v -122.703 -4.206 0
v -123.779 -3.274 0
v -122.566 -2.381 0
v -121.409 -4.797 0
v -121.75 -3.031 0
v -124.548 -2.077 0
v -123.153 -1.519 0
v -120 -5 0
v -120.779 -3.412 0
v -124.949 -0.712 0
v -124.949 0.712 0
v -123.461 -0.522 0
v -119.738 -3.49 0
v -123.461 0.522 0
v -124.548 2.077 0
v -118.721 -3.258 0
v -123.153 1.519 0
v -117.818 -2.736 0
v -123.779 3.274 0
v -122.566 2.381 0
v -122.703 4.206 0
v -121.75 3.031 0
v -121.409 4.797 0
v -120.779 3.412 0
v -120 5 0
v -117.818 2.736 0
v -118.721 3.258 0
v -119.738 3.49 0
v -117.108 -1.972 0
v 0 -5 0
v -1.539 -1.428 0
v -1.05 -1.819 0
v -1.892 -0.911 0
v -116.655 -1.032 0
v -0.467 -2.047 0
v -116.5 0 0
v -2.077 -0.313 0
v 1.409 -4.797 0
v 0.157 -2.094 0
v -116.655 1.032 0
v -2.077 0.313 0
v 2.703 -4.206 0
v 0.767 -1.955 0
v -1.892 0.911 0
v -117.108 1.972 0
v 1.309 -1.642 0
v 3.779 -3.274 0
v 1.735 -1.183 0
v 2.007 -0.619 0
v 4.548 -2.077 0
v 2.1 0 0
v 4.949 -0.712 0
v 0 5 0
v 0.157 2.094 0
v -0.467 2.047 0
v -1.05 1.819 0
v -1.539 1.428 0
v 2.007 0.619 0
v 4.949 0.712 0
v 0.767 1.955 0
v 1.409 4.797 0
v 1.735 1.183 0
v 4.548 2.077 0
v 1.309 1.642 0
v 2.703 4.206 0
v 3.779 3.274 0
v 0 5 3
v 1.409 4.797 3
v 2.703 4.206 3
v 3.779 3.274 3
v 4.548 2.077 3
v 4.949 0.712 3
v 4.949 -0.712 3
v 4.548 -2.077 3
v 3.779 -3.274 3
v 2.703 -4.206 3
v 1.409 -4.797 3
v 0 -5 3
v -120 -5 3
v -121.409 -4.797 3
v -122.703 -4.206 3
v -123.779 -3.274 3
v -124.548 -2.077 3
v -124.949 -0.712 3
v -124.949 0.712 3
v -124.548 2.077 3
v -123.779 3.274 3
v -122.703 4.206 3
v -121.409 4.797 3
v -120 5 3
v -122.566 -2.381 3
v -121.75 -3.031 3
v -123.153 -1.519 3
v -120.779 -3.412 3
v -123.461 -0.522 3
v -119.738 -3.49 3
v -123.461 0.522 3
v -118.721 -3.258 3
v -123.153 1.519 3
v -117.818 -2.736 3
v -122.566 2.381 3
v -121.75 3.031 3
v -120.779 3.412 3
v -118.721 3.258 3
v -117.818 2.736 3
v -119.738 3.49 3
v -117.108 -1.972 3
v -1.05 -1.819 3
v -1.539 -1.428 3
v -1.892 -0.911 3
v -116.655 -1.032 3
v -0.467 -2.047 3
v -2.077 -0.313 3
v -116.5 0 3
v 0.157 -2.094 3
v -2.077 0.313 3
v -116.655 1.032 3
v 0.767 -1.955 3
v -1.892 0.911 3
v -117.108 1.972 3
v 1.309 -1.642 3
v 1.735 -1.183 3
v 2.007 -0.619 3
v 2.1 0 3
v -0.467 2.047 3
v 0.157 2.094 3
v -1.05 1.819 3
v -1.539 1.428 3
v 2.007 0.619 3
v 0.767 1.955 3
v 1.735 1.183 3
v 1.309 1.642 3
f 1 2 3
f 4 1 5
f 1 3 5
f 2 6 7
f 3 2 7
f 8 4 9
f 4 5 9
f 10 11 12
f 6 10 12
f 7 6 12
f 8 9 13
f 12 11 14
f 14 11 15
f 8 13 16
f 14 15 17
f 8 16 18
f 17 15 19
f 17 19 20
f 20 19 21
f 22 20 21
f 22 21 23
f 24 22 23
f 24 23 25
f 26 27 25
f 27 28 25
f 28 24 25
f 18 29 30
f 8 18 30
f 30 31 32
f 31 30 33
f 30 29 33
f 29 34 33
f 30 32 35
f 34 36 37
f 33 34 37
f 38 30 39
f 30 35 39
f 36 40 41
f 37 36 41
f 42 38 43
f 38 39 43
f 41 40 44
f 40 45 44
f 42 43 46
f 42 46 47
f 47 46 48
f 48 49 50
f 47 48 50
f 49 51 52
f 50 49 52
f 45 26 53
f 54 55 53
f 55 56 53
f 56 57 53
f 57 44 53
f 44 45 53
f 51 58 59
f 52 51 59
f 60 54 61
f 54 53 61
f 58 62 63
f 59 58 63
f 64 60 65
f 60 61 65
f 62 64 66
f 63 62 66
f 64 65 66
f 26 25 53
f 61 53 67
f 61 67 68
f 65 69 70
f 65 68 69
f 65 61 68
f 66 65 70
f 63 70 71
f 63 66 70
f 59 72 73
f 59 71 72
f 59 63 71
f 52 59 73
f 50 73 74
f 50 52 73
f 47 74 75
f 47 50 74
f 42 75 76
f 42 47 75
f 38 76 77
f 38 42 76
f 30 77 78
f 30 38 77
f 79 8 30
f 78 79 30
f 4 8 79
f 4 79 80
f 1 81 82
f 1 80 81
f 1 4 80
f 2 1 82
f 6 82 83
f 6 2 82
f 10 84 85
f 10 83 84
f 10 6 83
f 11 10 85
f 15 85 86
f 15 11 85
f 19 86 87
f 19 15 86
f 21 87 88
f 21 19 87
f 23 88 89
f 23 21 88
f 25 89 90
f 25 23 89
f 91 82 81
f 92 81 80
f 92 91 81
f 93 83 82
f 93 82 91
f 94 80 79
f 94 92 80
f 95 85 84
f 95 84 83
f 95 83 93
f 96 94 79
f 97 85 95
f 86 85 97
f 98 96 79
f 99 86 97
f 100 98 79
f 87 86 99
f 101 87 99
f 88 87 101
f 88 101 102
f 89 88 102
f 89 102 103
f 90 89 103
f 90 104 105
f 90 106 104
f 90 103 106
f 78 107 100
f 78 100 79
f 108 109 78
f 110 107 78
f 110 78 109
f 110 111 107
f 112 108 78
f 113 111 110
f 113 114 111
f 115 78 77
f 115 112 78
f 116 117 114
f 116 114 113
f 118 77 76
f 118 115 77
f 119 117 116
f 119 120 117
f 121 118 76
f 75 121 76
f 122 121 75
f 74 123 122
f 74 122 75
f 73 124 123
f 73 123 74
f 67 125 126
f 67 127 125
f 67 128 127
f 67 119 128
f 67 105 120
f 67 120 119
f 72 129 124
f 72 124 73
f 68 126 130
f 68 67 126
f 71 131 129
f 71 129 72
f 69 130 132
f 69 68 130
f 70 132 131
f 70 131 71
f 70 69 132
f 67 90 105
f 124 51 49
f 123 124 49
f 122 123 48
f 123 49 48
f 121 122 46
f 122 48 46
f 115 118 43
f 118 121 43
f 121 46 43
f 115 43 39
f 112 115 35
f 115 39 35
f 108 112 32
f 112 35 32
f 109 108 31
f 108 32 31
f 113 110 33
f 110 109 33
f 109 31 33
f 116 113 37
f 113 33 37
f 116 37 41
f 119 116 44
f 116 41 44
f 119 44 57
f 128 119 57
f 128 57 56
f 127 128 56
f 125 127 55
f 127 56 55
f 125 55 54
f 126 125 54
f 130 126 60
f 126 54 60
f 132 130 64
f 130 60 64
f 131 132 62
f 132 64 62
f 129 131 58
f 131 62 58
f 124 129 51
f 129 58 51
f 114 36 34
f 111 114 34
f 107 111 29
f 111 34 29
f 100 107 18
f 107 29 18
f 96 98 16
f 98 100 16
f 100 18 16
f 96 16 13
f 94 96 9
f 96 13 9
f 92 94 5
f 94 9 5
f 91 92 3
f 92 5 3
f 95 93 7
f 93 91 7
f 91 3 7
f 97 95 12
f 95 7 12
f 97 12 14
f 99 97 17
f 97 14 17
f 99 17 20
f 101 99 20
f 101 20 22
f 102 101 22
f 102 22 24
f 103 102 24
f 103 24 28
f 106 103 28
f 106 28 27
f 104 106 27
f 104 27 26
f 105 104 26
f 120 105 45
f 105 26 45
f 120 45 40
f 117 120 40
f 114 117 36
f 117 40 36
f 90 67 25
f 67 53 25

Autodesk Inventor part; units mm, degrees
ref_plane "YZ Plane" through (0, 0, 0) normal (1, 0, 0) x (0, 1, 0)
ref_plane "XZ Plane" through (0, 0, 0) normal (0, 1, 0) x (-1, 0, 0)
ref_plane "XY Plane" through (0, 0, 0) normal (0, 0, 1) x (1, 0, 0)
sketch "草圖1" plane through (0, 0, 0) normal (0, 0, 1) x (1, 0, 0)
  line L0 (-120, 0) -> (0, 0) construction
  line L1 (-120, -5) -> (0, -5)
  line L2 (0, 5) -> (-120, 5)
  arc A0 (-120, 5) -> (-120, -5) centre (-120, 0) ccw
  arc A1 (0, -5) -> (0, 5) centre (0, 0) ccw
  circle A2 centre (-120, 0) radius 3.5
  circle A3 centre (0, 0) radius 2.1
  point P0 (-60, 0)
  dimension "d0" = 120
  dimension "d1" = 10
  dimension "d2" = 7
  dimension "d3" = 4.2
extrude "擠出1" add sketch "草圖1" along normal blind 3
sketch "草圖4" plane through (0, 0, 3) normal (0, 0, 1) x (1, 0, 0)
  line L0 (2.932, 0.7895) -> (0.36, 2.1968)
  arc A0 (0.36, 2.1968) -> (-0.36, 2.1968) centre (0, 1.5389) ccw
  line L1 (-0.36, 2.1968) -> (-2.932, 0.7895)
  arc A1 (-2.932, 0.7895) -> (-2.932, -0.7895) centre (-2.5, 0) ccw
  line L2 (-2.932, -0.7895) -> (-0.36, -2.1968)
  arc A2 (-0.36, -2.1968) -> (0.36, -2.1968) centre (0, -1.5389) ccw
  line L3 (0.36, -2.1968) -> (2.932, -0.7895)
  arc A3 (2.932, -0.7895) -> (2.932, 0.7895) centre (2.5, 0) ccw
  circle A4 centre (0, 0) radius 1.55
extrude "擠出3" [suppressed]
properties part number "adjustable_120"
